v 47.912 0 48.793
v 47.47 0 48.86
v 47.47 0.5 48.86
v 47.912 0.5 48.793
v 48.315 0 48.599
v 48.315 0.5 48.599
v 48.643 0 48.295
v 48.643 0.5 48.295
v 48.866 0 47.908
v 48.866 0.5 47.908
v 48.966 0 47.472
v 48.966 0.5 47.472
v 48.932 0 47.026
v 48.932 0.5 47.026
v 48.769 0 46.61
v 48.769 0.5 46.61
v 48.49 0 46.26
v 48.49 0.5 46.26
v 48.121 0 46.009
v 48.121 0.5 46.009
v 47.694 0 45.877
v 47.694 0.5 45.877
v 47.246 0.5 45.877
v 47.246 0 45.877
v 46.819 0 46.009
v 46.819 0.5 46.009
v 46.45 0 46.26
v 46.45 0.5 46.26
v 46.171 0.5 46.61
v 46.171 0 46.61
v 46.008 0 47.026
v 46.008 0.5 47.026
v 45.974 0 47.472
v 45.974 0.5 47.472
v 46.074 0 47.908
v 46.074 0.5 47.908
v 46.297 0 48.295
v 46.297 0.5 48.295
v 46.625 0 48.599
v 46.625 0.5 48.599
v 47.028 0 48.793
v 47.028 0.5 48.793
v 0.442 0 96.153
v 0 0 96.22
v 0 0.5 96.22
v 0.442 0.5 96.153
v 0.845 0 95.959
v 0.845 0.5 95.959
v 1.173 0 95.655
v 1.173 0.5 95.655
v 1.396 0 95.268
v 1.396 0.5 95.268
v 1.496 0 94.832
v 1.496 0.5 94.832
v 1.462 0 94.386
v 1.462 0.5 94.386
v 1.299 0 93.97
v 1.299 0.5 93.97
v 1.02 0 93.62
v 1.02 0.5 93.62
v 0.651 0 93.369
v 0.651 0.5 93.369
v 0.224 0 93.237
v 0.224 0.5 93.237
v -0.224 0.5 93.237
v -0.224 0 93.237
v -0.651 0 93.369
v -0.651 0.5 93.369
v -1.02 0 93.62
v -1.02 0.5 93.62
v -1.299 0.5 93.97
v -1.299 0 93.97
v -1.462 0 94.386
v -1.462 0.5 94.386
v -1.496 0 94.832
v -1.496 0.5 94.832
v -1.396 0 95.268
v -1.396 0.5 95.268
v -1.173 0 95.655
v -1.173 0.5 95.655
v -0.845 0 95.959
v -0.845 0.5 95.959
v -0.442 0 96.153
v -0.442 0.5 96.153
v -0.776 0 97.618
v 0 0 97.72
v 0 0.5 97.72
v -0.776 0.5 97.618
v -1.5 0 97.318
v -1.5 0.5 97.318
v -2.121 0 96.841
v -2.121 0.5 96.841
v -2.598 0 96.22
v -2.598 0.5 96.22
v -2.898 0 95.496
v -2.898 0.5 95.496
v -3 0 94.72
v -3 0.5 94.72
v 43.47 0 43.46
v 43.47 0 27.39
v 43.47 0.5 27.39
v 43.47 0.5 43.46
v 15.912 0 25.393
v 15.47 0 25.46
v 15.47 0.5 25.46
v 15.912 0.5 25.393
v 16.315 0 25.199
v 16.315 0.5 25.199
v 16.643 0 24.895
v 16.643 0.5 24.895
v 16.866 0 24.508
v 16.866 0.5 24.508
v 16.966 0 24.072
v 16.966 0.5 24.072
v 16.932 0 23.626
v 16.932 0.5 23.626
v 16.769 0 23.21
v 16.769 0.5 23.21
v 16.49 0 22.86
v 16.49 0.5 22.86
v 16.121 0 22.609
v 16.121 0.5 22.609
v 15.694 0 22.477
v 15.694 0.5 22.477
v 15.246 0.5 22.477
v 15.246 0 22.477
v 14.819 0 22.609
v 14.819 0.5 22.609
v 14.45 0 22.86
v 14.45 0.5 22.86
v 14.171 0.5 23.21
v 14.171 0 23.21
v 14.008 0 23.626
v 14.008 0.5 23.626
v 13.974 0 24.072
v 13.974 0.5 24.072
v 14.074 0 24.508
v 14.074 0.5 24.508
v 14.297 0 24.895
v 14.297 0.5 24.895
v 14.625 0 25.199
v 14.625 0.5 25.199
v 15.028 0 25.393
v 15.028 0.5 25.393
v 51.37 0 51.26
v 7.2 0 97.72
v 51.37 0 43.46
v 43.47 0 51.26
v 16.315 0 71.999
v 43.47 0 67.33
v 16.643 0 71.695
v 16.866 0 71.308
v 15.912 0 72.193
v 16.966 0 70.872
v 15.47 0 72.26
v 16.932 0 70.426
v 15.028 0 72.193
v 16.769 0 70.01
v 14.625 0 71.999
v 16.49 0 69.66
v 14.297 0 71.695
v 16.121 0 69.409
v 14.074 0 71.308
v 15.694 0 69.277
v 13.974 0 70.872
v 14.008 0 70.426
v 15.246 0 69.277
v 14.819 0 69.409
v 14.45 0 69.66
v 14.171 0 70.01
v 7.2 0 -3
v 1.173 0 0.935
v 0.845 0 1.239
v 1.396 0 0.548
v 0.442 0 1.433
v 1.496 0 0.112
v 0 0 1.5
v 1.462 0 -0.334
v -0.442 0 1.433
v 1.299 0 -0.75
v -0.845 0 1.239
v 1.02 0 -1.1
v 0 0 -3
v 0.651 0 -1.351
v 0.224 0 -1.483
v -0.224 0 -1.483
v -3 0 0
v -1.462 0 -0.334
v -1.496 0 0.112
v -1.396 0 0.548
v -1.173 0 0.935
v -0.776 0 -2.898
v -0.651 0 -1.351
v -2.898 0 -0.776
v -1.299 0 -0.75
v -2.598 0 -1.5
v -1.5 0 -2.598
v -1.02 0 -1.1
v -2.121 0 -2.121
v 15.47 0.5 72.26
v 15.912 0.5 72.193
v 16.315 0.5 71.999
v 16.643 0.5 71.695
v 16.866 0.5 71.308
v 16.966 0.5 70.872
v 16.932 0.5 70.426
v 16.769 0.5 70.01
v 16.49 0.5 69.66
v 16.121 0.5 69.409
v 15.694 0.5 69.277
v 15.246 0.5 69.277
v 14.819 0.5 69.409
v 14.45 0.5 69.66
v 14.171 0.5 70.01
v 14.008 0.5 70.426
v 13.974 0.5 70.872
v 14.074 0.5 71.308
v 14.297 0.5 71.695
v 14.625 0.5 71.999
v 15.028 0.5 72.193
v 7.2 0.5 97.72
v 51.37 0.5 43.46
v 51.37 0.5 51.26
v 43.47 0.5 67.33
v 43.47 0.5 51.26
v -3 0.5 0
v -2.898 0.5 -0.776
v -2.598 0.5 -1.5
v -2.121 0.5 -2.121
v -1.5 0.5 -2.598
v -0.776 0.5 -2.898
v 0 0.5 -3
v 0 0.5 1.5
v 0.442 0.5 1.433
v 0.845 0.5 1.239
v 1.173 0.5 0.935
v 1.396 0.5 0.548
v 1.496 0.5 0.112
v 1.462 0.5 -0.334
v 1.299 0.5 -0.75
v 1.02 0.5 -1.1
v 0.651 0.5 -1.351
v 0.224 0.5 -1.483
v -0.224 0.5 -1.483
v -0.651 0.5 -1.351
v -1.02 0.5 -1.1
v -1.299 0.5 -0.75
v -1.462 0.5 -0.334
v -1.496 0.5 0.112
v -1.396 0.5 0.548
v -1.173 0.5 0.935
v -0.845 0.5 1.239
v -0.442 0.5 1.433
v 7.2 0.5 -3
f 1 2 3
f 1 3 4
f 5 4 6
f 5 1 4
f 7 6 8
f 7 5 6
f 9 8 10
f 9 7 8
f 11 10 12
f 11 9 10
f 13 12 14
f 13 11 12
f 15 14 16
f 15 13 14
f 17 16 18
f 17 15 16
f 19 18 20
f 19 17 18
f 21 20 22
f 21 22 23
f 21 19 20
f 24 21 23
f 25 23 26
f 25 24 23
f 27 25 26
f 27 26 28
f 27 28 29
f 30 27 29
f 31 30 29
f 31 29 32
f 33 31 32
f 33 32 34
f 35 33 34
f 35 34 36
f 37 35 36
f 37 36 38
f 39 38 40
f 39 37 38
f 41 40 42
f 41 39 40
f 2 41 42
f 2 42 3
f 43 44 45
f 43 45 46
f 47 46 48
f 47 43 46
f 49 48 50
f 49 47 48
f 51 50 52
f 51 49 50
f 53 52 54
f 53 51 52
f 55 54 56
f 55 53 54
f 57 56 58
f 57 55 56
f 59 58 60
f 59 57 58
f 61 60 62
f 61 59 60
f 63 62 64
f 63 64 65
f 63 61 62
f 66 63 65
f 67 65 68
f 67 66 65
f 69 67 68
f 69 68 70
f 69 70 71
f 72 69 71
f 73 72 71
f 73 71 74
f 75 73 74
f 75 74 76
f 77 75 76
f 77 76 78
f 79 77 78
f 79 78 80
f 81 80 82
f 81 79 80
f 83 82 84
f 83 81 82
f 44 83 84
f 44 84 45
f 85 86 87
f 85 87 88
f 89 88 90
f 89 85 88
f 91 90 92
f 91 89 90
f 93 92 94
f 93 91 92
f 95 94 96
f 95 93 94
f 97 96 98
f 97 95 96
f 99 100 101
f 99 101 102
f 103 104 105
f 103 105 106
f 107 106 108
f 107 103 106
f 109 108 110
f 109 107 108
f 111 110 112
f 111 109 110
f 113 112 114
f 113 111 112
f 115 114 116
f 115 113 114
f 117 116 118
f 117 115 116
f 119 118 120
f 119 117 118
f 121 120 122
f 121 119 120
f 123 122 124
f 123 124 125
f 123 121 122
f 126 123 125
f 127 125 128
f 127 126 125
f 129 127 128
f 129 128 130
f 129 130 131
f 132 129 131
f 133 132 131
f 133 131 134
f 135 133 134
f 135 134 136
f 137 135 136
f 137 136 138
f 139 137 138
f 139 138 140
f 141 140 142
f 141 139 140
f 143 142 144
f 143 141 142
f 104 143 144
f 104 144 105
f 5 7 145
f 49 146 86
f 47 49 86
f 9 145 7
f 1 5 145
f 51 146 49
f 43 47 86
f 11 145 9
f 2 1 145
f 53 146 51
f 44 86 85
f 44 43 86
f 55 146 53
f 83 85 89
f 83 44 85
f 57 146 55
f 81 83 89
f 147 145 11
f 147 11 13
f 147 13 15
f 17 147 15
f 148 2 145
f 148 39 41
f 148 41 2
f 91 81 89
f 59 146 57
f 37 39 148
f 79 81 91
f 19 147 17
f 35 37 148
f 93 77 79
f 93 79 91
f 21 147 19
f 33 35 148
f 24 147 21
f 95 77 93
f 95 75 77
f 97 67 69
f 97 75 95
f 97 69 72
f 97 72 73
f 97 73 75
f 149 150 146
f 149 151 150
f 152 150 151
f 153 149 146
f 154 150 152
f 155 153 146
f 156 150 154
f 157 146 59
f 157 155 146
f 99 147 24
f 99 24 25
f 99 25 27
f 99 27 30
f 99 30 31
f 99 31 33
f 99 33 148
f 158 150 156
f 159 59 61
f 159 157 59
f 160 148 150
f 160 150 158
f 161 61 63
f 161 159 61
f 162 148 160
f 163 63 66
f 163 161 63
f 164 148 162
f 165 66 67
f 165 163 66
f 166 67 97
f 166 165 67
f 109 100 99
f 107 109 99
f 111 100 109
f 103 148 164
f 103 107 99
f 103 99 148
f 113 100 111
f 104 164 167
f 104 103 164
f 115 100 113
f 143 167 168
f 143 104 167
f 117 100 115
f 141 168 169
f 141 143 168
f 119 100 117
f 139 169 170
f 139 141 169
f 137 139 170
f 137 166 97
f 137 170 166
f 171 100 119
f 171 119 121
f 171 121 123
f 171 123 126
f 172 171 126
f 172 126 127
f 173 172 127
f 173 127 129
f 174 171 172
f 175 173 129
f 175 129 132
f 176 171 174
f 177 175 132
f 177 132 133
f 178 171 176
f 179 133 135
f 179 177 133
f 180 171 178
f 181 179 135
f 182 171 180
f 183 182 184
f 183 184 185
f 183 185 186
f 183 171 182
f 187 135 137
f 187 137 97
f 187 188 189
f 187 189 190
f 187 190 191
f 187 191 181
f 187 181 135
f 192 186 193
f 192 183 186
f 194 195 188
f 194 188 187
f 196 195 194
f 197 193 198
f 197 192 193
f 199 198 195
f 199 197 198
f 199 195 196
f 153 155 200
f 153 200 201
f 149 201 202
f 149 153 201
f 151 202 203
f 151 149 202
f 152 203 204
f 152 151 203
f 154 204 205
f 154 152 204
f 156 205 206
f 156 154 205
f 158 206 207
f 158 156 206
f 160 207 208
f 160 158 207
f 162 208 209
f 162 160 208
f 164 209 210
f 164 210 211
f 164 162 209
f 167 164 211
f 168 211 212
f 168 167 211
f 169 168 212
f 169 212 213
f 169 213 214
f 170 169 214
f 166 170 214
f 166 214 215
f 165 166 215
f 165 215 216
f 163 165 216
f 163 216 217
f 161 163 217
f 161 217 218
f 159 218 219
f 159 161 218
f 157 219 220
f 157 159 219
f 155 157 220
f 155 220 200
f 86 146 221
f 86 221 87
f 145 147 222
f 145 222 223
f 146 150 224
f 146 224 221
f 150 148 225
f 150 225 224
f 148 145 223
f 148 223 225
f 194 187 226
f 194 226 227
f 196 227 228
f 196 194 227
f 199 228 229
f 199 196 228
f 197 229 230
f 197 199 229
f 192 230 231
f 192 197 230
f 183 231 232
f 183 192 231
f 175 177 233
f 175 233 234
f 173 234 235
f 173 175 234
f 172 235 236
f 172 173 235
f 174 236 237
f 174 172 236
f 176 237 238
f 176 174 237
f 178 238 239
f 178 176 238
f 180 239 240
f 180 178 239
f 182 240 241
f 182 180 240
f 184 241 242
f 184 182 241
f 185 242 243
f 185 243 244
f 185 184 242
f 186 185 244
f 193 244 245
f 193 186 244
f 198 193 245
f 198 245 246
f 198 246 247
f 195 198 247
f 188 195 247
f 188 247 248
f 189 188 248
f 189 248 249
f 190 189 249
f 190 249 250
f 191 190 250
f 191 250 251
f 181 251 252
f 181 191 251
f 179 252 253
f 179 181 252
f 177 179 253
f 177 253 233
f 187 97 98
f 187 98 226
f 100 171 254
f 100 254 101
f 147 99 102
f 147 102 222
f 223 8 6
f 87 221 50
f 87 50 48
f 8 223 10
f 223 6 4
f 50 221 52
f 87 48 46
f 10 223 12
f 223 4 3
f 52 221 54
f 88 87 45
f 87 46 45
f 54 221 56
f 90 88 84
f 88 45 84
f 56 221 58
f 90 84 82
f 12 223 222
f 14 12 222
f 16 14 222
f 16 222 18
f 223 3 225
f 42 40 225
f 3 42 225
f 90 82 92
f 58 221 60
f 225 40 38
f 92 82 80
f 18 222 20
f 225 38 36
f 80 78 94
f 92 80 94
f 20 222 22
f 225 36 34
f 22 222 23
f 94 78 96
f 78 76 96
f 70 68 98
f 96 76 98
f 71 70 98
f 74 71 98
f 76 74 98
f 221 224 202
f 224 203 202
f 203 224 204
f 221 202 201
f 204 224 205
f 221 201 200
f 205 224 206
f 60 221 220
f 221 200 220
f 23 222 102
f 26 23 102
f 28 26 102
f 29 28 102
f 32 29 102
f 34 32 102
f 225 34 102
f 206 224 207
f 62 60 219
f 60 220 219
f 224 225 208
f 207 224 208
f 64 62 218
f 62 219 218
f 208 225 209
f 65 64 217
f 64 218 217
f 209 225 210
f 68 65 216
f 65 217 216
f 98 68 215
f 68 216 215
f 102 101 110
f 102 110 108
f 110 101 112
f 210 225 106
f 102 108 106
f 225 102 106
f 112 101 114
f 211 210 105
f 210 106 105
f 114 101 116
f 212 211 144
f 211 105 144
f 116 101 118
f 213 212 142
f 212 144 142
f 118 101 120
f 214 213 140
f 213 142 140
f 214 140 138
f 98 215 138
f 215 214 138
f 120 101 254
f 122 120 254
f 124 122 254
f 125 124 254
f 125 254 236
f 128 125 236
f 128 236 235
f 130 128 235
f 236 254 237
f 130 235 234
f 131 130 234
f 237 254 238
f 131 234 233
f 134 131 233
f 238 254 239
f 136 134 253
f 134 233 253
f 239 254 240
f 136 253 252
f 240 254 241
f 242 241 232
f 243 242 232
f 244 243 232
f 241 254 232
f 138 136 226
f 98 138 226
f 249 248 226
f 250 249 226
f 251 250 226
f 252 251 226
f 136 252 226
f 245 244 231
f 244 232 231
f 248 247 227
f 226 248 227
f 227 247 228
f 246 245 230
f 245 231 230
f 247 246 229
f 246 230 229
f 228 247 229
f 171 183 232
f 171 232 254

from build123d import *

# Parameters (mm, degrees)
CROQUIS1_R              = 1.5
SALIENTE_EXTRUIR1_DEPTH = 0.5


with BuildPart() as part:
    # Croquis1 → Saliente-Extruir1 (new body)
    with BuildSketch(Plane(origin=(0, 0, 0), x_dir=(1, 0, 0), z_dir=(0, 1, 0))):
        with BuildLine():
            Line((43.47, -43.46), (51.37, -43.46))
            Line((51.37, -43.46), (51.37, -51.26))
            Line((51.37, -51.26), (43.47, -51.26))
            Line((43.47, -51.26), (43.47, -67.33))
            Line((43.47, -67.33), (7.2, -97.72))
            Line((7.2, -97.72), (0, -97.72))
            ThreePointArc((0, -97.72), (-2.121320344, -96.841320344), (-3, -94.72))
            Line((-3, -94.72), (-3, 0))
            ThreePointArc((-3, 0), (-2.121320344, 2.121320344), (0, 3))
            Line((0, 3), (7.2, 3))
            Line((7.2, 3), (43.47, -27.39))
            Line((43.47, -27.39), (43.47, -43.46))
        make_face()
        with Locations(Location((0, 0, 0), (0, 0, 270))):
            Circle(CROQUIS1_R, mode=Mode.SUBTRACT)
        with Locations(Location((0, -94.72, 0), (0, 0, 270))):
            Circle(CROQUIS1_R, mode=Mode.SUBTRACT)
        with Locations(Location((47.47, -47.36, 0), (0, 0, 270))):
            Circle(CROQUIS1_R, mode=Mode.SUBTRACT)
        with Locations(Location((15.47, -23.96, 0), (0, 0, 270))):
            Circle(CROQUIS1_R, mode=Mode.SUBTRACT)
        with Locations(Location((15.47, -70.76, 0), (0, 0, 270))):
            Circle(CROQUIS1_R, mode=Mode.SUBTRACT)
    extrude(amount=SALIENTE_EXTRUIR1_DEPTH)


solid = part.part
